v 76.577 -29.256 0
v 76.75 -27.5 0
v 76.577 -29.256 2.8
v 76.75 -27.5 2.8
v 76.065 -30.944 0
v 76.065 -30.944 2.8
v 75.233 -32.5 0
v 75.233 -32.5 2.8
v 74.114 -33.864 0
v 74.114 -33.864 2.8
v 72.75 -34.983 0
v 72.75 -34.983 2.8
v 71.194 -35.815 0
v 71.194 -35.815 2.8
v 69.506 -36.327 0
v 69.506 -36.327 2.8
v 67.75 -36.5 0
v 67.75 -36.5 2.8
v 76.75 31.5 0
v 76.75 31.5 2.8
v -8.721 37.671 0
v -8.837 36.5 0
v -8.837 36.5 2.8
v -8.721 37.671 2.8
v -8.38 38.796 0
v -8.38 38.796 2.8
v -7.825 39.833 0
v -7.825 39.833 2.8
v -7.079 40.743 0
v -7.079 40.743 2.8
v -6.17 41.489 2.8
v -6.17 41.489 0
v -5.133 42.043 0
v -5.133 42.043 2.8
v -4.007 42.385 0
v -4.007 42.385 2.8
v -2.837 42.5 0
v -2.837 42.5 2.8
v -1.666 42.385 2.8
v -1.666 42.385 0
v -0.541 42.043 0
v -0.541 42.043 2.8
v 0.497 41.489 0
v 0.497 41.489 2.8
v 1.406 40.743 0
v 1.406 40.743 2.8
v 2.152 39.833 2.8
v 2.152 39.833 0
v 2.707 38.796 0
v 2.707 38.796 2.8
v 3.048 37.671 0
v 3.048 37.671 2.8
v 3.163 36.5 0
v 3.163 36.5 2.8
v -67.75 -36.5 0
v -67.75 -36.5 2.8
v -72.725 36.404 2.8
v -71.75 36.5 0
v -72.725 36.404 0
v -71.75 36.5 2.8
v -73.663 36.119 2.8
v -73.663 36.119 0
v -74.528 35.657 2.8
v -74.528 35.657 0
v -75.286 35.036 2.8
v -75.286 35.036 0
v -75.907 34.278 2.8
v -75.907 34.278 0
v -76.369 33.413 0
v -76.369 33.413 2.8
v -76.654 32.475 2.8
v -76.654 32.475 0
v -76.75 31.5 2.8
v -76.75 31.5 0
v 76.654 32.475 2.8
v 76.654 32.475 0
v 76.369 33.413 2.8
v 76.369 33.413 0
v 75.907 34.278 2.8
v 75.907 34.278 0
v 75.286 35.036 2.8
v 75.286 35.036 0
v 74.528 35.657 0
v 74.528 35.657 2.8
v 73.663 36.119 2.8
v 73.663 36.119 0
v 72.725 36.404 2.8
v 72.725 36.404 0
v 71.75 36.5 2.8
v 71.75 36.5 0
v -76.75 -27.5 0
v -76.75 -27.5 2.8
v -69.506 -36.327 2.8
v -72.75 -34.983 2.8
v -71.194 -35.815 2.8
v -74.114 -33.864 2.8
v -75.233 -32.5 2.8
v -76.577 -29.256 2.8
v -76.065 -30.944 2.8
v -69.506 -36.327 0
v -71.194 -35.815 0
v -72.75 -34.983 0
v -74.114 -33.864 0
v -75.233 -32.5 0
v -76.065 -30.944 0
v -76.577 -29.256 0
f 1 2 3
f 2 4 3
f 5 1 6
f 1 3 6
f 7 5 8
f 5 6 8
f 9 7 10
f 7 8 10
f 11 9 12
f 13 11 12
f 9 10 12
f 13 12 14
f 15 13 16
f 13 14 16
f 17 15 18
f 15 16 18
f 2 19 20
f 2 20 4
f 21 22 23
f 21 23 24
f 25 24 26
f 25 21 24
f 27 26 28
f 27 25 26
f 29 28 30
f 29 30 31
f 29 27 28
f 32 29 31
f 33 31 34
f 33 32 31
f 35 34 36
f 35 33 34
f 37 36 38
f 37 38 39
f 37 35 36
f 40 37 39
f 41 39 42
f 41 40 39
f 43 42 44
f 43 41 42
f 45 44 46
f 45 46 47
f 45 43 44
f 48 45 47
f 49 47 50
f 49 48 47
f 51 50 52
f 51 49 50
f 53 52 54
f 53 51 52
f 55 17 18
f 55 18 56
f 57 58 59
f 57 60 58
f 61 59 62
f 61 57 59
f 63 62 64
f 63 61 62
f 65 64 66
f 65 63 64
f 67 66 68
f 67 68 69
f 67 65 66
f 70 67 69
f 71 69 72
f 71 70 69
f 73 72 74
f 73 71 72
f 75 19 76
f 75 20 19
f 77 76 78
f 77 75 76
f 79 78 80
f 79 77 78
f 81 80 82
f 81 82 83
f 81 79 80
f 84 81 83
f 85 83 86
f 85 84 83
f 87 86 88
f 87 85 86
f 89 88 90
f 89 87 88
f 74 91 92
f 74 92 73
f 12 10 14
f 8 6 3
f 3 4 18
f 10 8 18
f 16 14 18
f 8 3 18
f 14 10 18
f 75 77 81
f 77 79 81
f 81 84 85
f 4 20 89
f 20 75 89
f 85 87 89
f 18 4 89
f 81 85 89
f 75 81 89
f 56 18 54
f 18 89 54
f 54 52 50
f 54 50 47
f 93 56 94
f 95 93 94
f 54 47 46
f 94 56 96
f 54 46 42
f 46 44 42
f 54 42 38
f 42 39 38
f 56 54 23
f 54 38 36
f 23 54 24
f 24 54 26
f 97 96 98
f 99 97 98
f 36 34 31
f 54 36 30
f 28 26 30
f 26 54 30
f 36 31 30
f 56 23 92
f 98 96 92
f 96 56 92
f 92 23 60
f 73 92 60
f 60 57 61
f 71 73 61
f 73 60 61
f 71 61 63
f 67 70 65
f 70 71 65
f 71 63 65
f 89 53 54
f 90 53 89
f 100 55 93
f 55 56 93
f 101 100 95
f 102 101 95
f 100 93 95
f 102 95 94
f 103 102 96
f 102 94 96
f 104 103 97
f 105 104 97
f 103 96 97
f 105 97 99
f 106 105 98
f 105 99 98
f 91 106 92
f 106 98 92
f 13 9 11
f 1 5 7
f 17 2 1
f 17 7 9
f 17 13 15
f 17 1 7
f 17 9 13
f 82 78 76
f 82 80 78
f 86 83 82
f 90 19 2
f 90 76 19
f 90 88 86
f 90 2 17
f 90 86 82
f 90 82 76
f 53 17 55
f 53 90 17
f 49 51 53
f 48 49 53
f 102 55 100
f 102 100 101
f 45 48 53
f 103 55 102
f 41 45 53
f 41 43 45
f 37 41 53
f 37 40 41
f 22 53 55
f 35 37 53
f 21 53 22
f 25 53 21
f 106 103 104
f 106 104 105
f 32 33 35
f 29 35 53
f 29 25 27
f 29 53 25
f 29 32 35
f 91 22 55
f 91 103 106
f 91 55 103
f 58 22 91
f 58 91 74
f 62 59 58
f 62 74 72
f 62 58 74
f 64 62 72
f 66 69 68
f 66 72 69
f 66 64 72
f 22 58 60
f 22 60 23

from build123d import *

# Parameters (mm, degrees)
BOSS_EXTRUDE1_DEPTH = 2.8
FILLET1_R           = 9
FILLET2_R           = 5


with BuildPart() as part:
    # Sketch1 → Boss-Extrude1 (new body)
    with BuildSketch(Plane.XY):
        with BuildLine():
            Line((3.163348562, 36.5), (76.75, 36.5))
            Line((76.75, 36.5), (76.75, -36.5))
            Line((76.75, -36.5), (-76.75, -36.5))
            Line((-76.75, -36.5), (-76.75, 36.5))
            Line((-76.75, 36.5), (-8.836651438, 36.5))
            ThreePointArc((-8.836651438, 36.5), (-2.836651438, 42.5), (3.163348562, 36.5))
        make_face()
    extrude(amount=BOSS_EXTRUDE1_DEPTH)

    # Fillet1
    fillet1_edges = [part.edges().sort_by_distance(p)[0] for p in [
        (76.75, -36.5, 1.4),
        (-76.75, -36.5, 1.4),
    ]]
    fillet(fillet1_edges, radius=FILLET1_R)

    # Fillet2
    fillet2_edges = [part.edges().sort_by_distance(p)[0] for p in [
        (-76.75, 36.5, 1.4),
        (76.75, 36.5, 1.4),
    ]]
    fillet(fillet2_edges, radius=FILLET2_R)


solid = part.part
